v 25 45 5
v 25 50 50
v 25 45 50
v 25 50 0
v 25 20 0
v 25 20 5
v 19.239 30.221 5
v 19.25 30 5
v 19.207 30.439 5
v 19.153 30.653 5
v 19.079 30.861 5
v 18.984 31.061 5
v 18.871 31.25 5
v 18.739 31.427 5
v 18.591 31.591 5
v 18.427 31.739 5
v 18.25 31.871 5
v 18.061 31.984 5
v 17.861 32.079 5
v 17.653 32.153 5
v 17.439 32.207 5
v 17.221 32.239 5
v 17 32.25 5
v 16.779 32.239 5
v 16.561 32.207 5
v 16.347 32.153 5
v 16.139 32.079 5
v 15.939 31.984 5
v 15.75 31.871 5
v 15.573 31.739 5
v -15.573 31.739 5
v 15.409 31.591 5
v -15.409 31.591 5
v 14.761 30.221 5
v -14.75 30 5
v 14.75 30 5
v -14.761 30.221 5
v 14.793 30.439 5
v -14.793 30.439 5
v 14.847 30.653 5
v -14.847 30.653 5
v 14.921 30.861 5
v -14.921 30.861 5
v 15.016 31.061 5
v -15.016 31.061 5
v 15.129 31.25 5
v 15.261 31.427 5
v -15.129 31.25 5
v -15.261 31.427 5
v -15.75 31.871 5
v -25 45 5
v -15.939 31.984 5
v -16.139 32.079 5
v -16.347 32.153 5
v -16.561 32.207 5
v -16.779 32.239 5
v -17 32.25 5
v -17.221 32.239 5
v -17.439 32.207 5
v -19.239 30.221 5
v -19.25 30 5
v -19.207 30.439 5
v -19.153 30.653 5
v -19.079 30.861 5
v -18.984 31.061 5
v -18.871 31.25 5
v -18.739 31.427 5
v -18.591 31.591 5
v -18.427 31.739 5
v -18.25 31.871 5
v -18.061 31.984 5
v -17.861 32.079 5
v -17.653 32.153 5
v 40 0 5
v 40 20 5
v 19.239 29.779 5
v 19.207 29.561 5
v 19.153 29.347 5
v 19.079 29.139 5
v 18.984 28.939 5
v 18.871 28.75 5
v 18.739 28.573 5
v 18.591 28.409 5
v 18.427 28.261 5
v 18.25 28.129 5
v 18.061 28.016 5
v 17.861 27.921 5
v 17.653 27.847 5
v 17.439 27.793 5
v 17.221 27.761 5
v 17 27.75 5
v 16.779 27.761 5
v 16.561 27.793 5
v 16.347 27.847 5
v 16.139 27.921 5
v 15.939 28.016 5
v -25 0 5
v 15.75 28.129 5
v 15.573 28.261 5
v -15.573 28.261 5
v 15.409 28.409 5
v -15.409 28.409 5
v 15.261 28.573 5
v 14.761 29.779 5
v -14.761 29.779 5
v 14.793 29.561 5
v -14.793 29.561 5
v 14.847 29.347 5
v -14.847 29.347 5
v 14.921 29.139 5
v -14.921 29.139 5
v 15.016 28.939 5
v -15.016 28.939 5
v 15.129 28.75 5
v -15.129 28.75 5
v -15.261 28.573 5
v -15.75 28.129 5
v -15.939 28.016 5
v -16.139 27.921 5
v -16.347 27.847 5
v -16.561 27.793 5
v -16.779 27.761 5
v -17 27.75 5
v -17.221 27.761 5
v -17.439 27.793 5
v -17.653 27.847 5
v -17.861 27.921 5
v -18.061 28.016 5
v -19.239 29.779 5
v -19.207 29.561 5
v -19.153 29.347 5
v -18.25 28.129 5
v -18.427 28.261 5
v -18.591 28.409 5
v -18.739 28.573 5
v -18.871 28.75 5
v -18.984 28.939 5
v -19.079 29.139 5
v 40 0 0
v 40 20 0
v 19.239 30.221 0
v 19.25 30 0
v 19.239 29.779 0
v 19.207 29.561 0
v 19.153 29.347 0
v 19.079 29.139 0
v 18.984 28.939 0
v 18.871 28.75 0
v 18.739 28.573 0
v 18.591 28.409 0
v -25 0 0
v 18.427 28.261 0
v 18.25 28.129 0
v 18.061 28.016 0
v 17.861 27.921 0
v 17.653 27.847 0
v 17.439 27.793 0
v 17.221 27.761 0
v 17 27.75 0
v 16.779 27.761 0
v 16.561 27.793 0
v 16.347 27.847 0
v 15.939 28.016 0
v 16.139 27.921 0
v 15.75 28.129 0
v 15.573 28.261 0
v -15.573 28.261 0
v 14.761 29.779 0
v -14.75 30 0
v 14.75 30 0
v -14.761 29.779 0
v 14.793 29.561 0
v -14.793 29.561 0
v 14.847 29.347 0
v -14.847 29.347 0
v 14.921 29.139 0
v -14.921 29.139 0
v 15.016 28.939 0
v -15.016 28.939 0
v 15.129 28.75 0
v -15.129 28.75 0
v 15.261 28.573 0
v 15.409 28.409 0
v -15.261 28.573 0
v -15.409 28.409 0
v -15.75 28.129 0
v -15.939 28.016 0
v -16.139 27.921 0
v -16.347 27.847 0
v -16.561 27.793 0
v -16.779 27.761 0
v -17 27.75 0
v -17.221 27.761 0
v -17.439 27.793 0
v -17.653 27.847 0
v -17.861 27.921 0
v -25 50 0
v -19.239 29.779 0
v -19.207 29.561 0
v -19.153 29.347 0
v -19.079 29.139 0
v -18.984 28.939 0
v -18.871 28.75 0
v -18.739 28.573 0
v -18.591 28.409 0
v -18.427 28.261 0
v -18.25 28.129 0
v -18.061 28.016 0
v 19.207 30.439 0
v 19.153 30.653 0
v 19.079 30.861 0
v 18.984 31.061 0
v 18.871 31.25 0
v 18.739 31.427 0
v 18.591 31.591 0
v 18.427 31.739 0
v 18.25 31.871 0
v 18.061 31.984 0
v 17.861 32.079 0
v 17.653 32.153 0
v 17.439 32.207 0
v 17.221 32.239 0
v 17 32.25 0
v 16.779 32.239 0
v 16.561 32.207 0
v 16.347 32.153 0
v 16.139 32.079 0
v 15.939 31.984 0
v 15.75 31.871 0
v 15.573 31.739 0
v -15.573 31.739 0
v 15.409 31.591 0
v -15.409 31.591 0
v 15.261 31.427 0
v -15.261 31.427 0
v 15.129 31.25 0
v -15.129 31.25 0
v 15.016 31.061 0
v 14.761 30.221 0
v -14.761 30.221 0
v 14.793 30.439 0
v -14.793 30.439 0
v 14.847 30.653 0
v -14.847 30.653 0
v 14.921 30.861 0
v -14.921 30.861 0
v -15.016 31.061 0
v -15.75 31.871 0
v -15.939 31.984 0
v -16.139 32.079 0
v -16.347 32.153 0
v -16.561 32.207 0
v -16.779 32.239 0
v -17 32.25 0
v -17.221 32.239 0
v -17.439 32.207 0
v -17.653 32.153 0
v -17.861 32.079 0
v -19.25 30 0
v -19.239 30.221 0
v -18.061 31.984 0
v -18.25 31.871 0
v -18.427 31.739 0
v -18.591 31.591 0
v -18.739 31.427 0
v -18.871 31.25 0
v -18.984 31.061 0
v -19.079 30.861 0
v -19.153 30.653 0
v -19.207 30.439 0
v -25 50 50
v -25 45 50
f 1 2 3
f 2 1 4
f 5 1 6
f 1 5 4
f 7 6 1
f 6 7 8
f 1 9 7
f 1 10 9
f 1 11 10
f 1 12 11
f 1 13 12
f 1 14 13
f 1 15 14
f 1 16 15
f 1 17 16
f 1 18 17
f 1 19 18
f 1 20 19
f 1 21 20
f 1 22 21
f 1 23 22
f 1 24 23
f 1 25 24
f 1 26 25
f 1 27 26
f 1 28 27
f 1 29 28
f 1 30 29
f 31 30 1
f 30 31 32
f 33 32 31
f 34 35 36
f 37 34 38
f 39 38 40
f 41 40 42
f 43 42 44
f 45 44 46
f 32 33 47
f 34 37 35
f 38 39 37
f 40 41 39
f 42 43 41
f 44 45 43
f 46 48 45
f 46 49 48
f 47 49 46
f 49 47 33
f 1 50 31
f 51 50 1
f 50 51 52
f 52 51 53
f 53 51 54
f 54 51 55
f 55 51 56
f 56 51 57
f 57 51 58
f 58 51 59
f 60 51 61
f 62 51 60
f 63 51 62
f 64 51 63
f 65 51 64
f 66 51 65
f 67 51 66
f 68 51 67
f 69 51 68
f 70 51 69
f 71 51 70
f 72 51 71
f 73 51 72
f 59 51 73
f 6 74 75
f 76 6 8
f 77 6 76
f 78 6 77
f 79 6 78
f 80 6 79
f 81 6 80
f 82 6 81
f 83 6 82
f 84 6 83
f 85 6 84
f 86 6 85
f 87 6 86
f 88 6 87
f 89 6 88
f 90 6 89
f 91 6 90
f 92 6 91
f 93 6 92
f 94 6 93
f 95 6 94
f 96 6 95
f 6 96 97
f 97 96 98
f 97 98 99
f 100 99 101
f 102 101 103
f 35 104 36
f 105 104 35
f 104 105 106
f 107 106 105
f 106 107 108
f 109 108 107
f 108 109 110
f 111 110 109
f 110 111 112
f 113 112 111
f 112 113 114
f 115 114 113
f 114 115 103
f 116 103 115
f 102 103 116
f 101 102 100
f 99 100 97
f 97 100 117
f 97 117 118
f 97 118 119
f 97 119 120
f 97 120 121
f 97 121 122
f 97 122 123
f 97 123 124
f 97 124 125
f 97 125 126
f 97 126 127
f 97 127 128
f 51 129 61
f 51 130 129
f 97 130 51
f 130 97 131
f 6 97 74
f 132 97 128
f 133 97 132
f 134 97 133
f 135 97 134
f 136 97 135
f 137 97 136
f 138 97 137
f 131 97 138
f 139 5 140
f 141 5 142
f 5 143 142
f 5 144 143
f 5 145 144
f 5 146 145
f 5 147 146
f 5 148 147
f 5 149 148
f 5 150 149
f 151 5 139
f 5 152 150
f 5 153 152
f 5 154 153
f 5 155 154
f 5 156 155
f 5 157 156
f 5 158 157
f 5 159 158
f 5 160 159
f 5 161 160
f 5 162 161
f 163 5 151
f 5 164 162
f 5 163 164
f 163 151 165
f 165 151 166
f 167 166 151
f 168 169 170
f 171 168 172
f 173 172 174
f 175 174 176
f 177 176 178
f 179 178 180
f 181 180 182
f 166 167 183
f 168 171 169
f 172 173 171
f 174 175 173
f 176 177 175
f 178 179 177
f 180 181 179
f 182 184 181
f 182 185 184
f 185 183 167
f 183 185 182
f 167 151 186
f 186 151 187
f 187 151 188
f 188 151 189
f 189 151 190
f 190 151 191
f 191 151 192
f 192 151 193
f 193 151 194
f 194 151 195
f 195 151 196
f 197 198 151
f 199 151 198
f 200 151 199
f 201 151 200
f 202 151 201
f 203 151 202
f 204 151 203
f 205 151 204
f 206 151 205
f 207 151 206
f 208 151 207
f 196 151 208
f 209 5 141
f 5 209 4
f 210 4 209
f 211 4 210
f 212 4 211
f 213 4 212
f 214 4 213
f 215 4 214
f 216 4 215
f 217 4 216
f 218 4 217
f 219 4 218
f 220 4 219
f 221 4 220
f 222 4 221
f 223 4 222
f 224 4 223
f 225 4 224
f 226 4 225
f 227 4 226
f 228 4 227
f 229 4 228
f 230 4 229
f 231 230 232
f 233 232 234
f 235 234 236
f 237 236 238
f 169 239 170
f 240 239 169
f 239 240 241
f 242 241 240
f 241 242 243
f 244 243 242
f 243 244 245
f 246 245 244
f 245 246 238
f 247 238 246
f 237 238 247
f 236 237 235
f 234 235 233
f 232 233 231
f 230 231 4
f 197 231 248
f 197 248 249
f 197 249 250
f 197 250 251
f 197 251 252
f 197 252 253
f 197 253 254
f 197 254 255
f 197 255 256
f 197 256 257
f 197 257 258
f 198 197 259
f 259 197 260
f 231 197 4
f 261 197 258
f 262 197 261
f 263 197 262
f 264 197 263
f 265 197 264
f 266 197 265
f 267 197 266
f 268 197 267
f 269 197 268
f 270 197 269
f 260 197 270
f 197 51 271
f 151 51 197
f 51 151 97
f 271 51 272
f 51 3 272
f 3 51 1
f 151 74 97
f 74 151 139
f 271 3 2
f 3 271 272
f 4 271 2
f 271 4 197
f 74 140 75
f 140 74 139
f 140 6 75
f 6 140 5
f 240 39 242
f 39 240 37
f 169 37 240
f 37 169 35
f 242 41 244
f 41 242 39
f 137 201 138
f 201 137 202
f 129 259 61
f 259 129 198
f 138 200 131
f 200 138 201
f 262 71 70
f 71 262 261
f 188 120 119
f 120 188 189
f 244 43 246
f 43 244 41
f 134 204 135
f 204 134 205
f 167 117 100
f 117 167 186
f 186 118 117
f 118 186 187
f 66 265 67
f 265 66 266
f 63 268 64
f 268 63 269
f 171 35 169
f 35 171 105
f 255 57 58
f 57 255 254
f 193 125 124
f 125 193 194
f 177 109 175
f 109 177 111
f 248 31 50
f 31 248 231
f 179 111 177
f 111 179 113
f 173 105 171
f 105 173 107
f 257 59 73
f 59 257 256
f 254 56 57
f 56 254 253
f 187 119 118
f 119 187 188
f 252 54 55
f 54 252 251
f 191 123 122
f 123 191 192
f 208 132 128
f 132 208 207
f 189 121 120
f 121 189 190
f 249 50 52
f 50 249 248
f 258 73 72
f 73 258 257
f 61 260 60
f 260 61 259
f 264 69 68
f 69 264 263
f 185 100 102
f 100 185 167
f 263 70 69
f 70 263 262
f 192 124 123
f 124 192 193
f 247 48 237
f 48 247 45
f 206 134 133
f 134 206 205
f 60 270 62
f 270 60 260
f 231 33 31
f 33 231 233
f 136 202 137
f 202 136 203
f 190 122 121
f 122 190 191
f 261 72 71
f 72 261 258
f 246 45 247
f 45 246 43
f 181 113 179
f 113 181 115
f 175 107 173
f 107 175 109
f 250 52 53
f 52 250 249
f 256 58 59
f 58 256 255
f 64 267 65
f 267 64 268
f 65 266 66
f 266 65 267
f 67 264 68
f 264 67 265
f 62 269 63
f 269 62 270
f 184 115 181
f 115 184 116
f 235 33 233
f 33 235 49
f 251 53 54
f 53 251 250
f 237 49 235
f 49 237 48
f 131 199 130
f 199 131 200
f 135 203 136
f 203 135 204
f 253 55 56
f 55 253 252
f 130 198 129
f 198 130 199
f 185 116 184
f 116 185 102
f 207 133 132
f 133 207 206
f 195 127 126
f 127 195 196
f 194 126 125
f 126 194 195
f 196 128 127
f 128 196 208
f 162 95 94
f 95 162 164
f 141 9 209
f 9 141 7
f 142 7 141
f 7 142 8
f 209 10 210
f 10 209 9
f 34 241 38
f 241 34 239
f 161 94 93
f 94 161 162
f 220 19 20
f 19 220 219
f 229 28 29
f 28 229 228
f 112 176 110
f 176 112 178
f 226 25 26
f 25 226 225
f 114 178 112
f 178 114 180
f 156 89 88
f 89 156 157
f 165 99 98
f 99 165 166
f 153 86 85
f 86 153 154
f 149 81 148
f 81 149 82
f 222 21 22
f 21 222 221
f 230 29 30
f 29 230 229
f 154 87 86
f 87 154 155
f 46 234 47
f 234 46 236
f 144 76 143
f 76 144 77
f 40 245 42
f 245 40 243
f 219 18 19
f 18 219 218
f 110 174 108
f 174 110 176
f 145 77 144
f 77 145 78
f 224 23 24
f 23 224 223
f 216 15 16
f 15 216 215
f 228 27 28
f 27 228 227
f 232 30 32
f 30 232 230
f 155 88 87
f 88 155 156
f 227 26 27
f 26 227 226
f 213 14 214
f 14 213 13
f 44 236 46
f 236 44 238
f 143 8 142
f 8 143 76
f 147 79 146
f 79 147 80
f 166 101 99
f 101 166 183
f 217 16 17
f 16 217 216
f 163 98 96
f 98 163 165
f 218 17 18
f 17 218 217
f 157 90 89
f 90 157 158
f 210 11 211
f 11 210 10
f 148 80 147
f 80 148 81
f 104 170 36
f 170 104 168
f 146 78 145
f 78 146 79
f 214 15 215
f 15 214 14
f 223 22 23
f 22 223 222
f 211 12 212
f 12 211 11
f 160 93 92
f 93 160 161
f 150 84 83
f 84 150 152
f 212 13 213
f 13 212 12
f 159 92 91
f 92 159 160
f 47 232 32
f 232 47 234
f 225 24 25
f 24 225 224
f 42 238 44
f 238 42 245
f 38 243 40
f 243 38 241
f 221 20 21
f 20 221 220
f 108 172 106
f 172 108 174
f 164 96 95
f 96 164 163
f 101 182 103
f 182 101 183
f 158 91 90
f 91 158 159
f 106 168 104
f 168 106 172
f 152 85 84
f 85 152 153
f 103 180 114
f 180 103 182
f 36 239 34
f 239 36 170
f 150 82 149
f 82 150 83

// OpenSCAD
// L-shaped mounting bracket for NEMA 17 stepper motor.
// Base plate: 50 x 45 x 5 mm. Motor plate: 50 x 5 x 50 mm.
// Includes M4 mounting holes, motor boss hole, M3 screw holes, and triangular gussets.

// Base plate dimensions
base_x = 50;
base_y = 45;
base_z = 5;

// Motor plate dimensions
motor_x = 50;
motor_y = 5;
motor_z = 50;

// Hole dimensions
m4_hole_d = 4.5;
m3_hole_d = 3.4;
boss_hole_d = 23;

// Gusset dimensions
gusset_thickness = 5;
gusset_leg_y = 20;
gusset_leg_z = 20;

// Hole positions
hole1_x = -17;
hole1_y = 30;
hole2_x = 17;
hole2_y = 30;

boss_x = 0;
boss_z = 28;

// Gusset positions (flush with left and right edges)
gusset_left_x_start = -25;
gusset_left_x_end = -20;
gusset_right_x_start = 20;
gusset_right_x_end = 25;

$fn = 64;

// Create the main L-shaped body
difference() {
    union() {
        // Base plate
        translate([-base_x / 2, 0, 0]) cube([base_x, base_y, base_z]);
        
        // Motor plate (standing on the back edge of the base)
        // Back edge is at y = base_y = 45.
        translate([-motor_x / 2, base_y, 0]) cube([motor_x, motor_y, motor_z]);
        
        // Gussets (triangular prisms in YZ plane, extruded along X)
        // Left Gusset
        translate([gusset_left_x_start, 0, 0]) 
            linear_extrude(gusset_left_x_end - gusset_left_x_start)
                polygon([
                    [0, 0],      // (y=0, z=0) - bottom left
                    [gusset_leg_y, 0], // (y=20, z=0) - bottom right
                    [gusset_leg_y, gusset_leg_z], // (y=20, z=20) - top right
                    [0, gusset_leg_z]  // (y=0, z=20) - top left
                ]);
        
        // Right Gusset
        translate([gusset_right_x_start, 0, 0]) 
            linear_extrude(gusset_right_x_end - gusset_right_x_start)
                polygon([
                    [0, 0],      // (y=0, z=0) - bottom left
                    [gusset_leg_y, 0], // (y=20, z=0) - bottom right
                    [gusset_leg_y, gusset_leg_z], // (y=20, z=20) - top right
                    [0, gusset_leg_z]  // (y=0, z=20) - top left
                ]);
    }
    
    // Cut M4 holes in base plate
    for (i = [0 : 1]) {
        translate([
            i == 0 ? hole1_x : hole2_x,
            hole1_y,
            0
        ]) cylinder(h = base_z + 1, d = m4_hole_d);
    }
    
    // Cut Motor Boss Hole
    translate([boss_x, 0, boss_z]) cylinder(h = motor_y + 1, d = boss_hole_d);
    
    // Cut M3 screw holes in motor plate
    // Pattern: 31 mm square centred on boss hole (x=0, z=28)
    // Square corners relative to center: +/- 15.5 mm
    offset_x = 15.5;
    offset_z = 15.5;
    
    for (sx = [-1, 1], sz = [-1, 1]) {
        translate([
            boss_x + sx * offset_x,
            0,
            boss_z + sz * offset_z
        ]) cylinder(h = motor_y + 1, d = m3_hole_d);
    }
}
